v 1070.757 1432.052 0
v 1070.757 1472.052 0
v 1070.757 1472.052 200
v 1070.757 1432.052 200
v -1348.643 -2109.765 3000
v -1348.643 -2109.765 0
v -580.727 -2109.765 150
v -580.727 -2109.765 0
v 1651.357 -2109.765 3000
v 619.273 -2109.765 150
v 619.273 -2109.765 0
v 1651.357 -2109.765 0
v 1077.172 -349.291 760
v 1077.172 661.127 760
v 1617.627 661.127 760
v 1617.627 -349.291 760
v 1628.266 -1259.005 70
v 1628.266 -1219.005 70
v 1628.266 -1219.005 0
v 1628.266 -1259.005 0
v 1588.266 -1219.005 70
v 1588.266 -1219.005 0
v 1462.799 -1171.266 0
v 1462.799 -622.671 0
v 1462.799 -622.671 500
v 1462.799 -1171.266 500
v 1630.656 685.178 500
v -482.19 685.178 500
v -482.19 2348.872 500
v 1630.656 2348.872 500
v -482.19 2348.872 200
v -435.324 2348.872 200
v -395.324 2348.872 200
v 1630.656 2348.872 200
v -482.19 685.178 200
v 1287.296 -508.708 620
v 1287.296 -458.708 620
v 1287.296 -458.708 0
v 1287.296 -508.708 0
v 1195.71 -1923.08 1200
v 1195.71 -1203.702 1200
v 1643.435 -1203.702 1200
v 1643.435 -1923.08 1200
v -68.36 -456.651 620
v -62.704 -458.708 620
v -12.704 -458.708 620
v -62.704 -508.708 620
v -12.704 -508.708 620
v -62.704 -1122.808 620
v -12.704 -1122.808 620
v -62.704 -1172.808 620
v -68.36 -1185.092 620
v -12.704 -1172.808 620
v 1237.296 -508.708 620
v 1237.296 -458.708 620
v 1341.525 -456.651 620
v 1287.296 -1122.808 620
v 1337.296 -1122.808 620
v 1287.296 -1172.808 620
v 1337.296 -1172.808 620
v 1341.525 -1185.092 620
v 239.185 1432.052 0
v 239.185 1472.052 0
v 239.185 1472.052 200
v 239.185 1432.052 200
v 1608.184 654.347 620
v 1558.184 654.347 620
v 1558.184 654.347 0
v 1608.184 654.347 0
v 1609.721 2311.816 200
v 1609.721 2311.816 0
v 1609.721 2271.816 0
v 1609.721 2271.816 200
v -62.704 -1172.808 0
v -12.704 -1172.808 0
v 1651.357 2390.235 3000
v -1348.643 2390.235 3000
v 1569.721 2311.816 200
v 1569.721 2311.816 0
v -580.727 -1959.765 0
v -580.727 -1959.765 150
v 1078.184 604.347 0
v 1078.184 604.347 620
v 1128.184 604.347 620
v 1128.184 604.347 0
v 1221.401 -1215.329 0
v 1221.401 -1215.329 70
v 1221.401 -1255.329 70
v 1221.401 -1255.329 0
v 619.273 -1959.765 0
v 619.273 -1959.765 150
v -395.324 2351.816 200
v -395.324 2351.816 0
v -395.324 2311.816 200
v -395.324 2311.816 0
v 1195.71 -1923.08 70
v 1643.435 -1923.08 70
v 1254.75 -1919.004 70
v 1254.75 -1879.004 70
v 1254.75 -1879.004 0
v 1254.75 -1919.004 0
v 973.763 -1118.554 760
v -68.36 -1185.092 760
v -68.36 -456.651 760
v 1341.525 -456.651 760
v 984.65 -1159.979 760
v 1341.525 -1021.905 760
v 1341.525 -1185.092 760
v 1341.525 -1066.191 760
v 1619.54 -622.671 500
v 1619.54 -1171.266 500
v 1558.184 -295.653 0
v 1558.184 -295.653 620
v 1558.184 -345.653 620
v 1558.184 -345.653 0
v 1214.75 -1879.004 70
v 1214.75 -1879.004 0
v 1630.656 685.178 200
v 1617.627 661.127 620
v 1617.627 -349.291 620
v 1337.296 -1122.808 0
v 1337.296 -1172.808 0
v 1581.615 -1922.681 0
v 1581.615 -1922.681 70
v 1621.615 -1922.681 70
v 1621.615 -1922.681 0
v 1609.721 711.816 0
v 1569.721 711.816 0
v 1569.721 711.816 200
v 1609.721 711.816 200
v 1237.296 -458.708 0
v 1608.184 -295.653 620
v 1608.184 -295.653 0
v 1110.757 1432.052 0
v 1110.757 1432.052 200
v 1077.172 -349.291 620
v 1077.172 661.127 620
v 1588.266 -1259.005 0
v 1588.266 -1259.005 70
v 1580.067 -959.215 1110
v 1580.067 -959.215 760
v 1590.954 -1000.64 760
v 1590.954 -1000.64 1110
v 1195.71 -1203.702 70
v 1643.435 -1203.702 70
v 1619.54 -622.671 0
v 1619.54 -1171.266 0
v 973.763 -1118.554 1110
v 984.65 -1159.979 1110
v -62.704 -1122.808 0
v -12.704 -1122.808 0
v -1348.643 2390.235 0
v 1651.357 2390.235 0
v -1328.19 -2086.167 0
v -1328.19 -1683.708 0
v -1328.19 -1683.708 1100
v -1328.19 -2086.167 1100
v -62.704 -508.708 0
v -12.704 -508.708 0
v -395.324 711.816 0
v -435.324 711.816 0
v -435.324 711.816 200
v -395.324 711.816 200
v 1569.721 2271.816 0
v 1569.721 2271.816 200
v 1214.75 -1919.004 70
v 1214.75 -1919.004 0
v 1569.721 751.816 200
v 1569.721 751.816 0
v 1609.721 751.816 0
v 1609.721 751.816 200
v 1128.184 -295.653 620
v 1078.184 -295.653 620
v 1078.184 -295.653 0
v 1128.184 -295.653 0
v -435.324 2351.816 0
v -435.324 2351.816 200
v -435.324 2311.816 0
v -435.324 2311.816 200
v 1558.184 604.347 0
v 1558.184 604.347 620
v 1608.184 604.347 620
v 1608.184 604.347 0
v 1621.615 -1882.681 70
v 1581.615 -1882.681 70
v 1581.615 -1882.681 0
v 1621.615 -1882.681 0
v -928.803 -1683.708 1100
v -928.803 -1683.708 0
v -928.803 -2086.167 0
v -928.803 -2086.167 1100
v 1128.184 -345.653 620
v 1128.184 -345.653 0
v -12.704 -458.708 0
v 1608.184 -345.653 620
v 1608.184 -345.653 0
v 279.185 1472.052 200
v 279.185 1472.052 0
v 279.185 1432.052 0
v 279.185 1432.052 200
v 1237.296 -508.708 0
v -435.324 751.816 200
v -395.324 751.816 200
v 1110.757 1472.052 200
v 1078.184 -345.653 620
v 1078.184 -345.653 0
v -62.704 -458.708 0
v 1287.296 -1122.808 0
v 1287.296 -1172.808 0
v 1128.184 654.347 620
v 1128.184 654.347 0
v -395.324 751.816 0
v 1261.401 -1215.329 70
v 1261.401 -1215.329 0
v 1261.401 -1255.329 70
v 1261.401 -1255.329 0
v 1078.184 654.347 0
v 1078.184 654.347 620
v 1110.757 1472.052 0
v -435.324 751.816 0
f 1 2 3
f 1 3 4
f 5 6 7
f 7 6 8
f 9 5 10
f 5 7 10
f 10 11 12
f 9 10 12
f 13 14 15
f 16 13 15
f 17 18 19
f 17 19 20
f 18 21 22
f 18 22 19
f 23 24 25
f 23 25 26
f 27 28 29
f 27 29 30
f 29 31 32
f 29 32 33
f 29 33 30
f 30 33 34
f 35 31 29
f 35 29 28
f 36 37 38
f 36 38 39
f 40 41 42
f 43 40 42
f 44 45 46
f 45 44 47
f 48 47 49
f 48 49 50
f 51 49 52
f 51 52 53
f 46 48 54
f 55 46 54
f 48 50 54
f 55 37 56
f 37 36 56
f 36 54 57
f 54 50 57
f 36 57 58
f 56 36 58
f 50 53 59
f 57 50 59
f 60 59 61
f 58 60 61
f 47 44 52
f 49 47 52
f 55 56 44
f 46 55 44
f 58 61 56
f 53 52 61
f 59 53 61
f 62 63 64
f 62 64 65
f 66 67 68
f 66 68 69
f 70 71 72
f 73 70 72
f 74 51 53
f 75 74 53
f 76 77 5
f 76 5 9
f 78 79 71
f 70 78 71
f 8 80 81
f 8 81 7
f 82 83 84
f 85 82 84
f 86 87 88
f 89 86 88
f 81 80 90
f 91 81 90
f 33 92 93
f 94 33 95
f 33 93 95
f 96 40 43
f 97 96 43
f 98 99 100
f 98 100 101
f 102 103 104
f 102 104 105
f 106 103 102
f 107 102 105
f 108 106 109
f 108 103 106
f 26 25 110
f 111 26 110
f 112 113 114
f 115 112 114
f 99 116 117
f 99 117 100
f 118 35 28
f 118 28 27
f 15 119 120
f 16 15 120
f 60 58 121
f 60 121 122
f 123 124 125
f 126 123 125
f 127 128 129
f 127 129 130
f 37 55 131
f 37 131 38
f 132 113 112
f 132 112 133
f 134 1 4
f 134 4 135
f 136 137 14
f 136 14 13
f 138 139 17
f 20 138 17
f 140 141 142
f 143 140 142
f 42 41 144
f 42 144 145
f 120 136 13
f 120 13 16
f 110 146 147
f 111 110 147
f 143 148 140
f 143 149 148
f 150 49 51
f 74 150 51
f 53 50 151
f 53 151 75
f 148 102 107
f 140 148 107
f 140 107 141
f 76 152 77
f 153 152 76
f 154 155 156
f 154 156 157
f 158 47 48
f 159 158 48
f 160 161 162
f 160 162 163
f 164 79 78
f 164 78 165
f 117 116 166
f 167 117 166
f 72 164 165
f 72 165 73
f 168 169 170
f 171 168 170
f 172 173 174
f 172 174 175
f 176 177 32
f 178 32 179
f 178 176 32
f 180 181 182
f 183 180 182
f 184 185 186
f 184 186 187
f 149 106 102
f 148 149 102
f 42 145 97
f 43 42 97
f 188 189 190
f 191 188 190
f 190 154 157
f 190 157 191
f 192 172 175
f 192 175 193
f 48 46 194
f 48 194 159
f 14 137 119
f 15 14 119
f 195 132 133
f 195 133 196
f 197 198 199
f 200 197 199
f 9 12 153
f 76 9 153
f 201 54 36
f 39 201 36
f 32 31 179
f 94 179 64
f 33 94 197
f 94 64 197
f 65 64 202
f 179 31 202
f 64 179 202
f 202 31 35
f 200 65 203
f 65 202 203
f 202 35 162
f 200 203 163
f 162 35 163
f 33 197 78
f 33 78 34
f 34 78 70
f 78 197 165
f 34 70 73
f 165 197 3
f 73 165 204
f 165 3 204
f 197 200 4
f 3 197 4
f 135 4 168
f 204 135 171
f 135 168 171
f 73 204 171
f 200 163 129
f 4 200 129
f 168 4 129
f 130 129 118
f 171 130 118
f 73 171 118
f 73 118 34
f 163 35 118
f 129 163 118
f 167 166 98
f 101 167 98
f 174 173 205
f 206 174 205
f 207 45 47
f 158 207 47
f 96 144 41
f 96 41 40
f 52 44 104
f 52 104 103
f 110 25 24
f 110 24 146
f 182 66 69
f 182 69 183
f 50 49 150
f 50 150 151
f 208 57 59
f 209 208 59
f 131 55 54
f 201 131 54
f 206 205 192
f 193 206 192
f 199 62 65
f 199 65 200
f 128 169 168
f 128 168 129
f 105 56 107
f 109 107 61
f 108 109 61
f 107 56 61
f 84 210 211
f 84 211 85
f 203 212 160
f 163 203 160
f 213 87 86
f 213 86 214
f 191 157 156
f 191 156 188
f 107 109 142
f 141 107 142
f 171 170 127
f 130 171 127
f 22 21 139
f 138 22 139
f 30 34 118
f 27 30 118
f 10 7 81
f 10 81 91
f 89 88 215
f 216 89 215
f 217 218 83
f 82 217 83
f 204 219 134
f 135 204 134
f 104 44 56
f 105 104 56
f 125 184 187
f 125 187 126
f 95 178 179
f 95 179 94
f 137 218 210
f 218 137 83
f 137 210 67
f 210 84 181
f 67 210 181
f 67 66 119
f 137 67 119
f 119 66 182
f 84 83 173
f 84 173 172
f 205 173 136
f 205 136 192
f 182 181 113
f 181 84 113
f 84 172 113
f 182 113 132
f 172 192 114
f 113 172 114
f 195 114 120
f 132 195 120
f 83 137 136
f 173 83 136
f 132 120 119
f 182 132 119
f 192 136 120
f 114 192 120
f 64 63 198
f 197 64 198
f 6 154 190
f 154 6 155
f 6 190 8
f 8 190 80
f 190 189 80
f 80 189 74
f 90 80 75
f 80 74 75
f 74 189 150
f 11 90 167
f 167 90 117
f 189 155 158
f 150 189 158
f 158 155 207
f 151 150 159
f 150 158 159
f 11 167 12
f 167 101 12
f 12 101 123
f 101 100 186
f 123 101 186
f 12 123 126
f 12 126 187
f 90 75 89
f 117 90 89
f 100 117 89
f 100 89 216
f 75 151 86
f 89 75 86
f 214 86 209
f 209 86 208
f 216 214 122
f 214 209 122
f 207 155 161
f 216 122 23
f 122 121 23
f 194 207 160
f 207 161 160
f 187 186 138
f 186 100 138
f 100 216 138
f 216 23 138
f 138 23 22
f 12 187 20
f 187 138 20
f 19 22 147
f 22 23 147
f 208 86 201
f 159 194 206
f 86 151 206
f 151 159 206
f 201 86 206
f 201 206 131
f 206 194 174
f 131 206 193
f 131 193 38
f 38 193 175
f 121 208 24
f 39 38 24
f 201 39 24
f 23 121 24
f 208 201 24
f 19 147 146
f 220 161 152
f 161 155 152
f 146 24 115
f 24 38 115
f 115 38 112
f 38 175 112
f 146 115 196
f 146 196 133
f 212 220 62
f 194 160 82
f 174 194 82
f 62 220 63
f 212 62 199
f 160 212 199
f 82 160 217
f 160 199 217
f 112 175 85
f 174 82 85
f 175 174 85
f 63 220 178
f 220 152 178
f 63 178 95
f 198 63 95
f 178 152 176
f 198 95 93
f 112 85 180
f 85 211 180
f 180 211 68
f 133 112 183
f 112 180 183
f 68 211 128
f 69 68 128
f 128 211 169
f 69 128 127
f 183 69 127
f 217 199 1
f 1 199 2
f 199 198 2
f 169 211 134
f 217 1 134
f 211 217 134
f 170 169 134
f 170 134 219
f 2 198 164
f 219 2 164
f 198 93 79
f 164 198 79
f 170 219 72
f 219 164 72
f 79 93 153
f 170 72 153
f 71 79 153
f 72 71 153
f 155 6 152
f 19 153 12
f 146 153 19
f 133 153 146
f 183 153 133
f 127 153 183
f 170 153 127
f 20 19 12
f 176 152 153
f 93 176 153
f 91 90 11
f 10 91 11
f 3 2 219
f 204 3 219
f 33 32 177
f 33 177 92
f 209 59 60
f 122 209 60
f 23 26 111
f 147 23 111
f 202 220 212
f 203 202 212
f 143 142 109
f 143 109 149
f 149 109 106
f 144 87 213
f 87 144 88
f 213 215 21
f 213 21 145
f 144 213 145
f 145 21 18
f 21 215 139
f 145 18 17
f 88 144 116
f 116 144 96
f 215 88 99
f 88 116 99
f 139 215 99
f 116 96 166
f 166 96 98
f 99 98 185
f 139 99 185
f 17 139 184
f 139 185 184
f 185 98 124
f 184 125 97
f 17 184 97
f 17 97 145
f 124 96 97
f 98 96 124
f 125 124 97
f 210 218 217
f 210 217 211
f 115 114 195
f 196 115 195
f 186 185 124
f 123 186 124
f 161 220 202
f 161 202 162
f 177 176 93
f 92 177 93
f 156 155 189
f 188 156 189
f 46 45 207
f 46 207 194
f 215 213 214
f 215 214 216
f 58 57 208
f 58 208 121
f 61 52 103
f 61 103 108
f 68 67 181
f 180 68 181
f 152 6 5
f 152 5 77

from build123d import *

# Parameters (mm, degrees)
SKETCH_W        = 3000
SKETCH_H        = 4500
PAD_DEPTH       = 3000
SKETCH001_W     = 50
SKETCH001_H     = 50
POCKET_DEPTH    = 620
SKETCH002_W     = 1409.884701
SKETCH002_H     = 728.440368
SKETCH002_W_2   = 540.455688
SKETCH002_H_2   = 1010.417297
POCKET001_DEPTH = 140
SKETCH003_W     = 40
SKETCH003_H     = 40
POCKET002_DEPTH = 200
SKETCH004_W     = 2112.84549
SKETCH004_H     = 1663.694153
POCKET003_DEPTH = 300
SKETCH005_W     = 156.741333
SKETCH005_H     = 548.59497
POCKET004_DEPTH = 500
POCKET005_DEPTH = 350
SKETCH007_W     = 40
SKETCH007_H     = 40
POCKET006_DEPTH = 70
SKETCH008_W     = 447.72461
SKETCH008_H     = 719.377807
POCKET007_DEPTH = 1130
SKETCH009_W     = 399.386474
SKETCH009_H     = 402.45874
POCKET008_DEPTH = 1100
SKETCH010_W     = 1200
SKETCH010_H     = 150
POCKET009_DEPTH = 150


with BuildPart() as part:
    # Sketch → Pad (new body)
    with BuildSketch(Plane.XY):
        with Locations((151.357382, 140.234829)):
            Rectangle(SKETCH_W, SKETCH_H)
    extrude(amount=PAD_DEPTH)

    # Sketch001 (on Face5 of Pad) → Pocket (cut)
    with BuildSketch(Plane(origin=(0, 0, 0), x_dir=(1, 0, 0), z_dir=(0, 0, -1))):
        with Locations((1312.296392, 1147.807671)):
            Rectangle(SKETCH001_W, SKETCH001_H)
        with Locations((1262.296363, 483.708062)):
            Rectangle(SKETCH001_W, SKETCH001_H)
        with Locations((-37.703608, 1147.807727)):
            Rectangle(SKETCH001_W, SKETCH001_H)
        with Locations((-37.703637, 483.708118)):
            Rectangle(SKETCH001_W, SKETCH001_H)
        with Locations((1583.184133, 320.652509)):
            Rectangle(SKETCH001_W, SKETCH001_H)
        with Locations((1583.184094, -629.347491)):
            Rectangle(SKETCH001_W, SKETCH001_H)
        with Locations((1103.184133, 320.65253)):
            Rectangle(SKETCH001_W, SKETCH001_H)
        with Locations((1103.184094, -629.34747)):
            Rectangle(SKETCH001_W, SKETCH001_H)
    extrude(amount=-POCKET_DEPTH, mode=Mode.SUBTRACT)

    # Sketch002 (on Face41 of Pocket) → Pocket001 (cut)
    with BuildSketch(Plane(origin=(0, 0, 620), x_dir=(1, 0, 0), z_dir=(0, 0, -1))):
        with Locations((636.582521, 820.87149)):
            Rectangle(SKETCH002_W, SKETCH002_H)
        with Locations((1347.399597, -155.917999)):
            Rectangle(SKETCH002_W_2, SKETCH002_H_2)
    extrude(amount=-POCKET001_DEPTH, mode=Mode.SUBTRACT)

    # Sketch003 (on Face4 of Pocket001) → Pocket002 (cut)
    with BuildSketch(Plane(origin=(0, 0, 0), x_dir=(1, 0, 0), z_dir=(0, 0, -1))):
        with Locations((1589.720951, -2291.816083)):
            Rectangle(SKETCH003_W, SKETCH003_H)
        with Locations((-415.324337, -2331.815908)):
            Rectangle(SKETCH003_W, SKETCH003_H)
        with Locations((1589.721091, -731.816083)):
            Rectangle(SKETCH003_W, SKETCH003_H)
        with Locations((-415.324197, -731.815908)):
            Rectangle(SKETCH003_W, SKETCH003_H)
        with Locations((259.185181, -1452.052124)):
            Rectangle(SKETCH003_W, SKETCH003_H)
        with Locations((1090.75708, -1452.052124)):
            Rectangle(SKETCH003_W, SKETCH003_H)
    extrude(amount=-POCKET002_DEPTH, mode=Mode.SUBTRACT)

    # Sketch004 (on Face65 of Pocket002) → Pocket003 (cut)
    with BuildSketch(Plane(origin=(0, 0, 200), x_dir=(1, 0, 0), z_dir=(0, 0, -1))):
        with Locations((574.232895, -1517.024749)):
            Rectangle(SKETCH004_W, SKETCH004_H)
    extrude(amount=-POCKET003_DEPTH, mode=Mode.SUBTRACT)

    # Sketch005 (on Face4 of Pocket003) → Pocket004 (cut)
    with BuildSketch(Plane(origin=(0, 0, 0), x_dir=(1, 0, 0), z_dir=(0, 0, -1))):
        with Locations((1541.169494, 896.96875)):
            Rectangle(SKETCH005_W, SKETCH005_H)
    extrude(amount=-POCKET004_DEPTH, mode=Mode.SUBTRACT)

    # Sketch006 (on Face84 of Pocket004) → Pocket005 (cut)
    with BuildSketch(Plane(origin=(0, 0, 760), x_dir=(1, 0, 0), z_dir=(0, 0, -1))):
        Polygon((973.763098, 1118.553795), (1580.067498, 959.214839), (1590.954249, 1000.640272), (984.649849, 1159.979227), align=None)
    extrude(amount=-POCKET005_DEPTH, mode=Mode.SUBTRACT)

    # Sketch007 (on Face4 of Pocket005) → Pocket006 (cut)
    with BuildSketch(Plane(origin=(0, 0, 0), x_dir=(1, 0, 0), z_dir=(0, 0, -1))):
        with Locations((1234.749634, 1899.004272)):
            Rectangle(SKETCH007_W, SKETCH007_H)
        with Locations((1601.614674, 1902.68077)):
            Rectangle(SKETCH007_W, SKETCH007_H)
        with Locations((1241.400585, 1235.328873)):
            Rectangle(SKETCH007_W, SKETCH007_H)
        with Locations((1608.265625, 1239.005371)):
            Rectangle(SKETCH007_W, SKETCH007_H)
    extrude(amount=-POCKET006_DEPTH, mode=Mode.SUBTRACT)

    # Sketch008 (on Face84 of Pocket006) → Pocket007 (cut)
    with BuildSketch(Plane(origin=(0, 0, 70), x_dir=(1, 0, 0), z_dir=(0, 0, -1))):
        with Locations((1419.572632, 1563.391296)):
            Rectangle(SKETCH008_W, SKETCH008_H)
    extrude(amount=-POCKET007_DEPTH, mode=Mode.SUBTRACT)

    # Sketch009 (on Face4 of Pocket007) → Pocket008 (cut)
    with BuildSketch(Plane(origin=(0, 0, 0), x_dir=(1, 0, 0), z_dir=(0, 0, -1))):
        with Locations((-1128.49646, 1884.937378)):
            Rectangle(SKETCH009_W, SKETCH009_H)
    extrude(amount=-POCKET008_DEPTH, mode=Mode.SUBTRACT)

    # Sketch010 (on Face4 of Pocket008) → Pocket009 (cut)
    with BuildSketch(Plane(origin=(0, 0, 0), x_dir=(1, 0, 0), z_dir=(0, 0, -1))):
        with Locations((19.272915, 2034.765171)):
            Rectangle(SKETCH010_W, SKETCH010_H)
    extrude(amount=-POCKET009_DEPTH, mode=Mode.SUBTRACT)


solid = part.part
